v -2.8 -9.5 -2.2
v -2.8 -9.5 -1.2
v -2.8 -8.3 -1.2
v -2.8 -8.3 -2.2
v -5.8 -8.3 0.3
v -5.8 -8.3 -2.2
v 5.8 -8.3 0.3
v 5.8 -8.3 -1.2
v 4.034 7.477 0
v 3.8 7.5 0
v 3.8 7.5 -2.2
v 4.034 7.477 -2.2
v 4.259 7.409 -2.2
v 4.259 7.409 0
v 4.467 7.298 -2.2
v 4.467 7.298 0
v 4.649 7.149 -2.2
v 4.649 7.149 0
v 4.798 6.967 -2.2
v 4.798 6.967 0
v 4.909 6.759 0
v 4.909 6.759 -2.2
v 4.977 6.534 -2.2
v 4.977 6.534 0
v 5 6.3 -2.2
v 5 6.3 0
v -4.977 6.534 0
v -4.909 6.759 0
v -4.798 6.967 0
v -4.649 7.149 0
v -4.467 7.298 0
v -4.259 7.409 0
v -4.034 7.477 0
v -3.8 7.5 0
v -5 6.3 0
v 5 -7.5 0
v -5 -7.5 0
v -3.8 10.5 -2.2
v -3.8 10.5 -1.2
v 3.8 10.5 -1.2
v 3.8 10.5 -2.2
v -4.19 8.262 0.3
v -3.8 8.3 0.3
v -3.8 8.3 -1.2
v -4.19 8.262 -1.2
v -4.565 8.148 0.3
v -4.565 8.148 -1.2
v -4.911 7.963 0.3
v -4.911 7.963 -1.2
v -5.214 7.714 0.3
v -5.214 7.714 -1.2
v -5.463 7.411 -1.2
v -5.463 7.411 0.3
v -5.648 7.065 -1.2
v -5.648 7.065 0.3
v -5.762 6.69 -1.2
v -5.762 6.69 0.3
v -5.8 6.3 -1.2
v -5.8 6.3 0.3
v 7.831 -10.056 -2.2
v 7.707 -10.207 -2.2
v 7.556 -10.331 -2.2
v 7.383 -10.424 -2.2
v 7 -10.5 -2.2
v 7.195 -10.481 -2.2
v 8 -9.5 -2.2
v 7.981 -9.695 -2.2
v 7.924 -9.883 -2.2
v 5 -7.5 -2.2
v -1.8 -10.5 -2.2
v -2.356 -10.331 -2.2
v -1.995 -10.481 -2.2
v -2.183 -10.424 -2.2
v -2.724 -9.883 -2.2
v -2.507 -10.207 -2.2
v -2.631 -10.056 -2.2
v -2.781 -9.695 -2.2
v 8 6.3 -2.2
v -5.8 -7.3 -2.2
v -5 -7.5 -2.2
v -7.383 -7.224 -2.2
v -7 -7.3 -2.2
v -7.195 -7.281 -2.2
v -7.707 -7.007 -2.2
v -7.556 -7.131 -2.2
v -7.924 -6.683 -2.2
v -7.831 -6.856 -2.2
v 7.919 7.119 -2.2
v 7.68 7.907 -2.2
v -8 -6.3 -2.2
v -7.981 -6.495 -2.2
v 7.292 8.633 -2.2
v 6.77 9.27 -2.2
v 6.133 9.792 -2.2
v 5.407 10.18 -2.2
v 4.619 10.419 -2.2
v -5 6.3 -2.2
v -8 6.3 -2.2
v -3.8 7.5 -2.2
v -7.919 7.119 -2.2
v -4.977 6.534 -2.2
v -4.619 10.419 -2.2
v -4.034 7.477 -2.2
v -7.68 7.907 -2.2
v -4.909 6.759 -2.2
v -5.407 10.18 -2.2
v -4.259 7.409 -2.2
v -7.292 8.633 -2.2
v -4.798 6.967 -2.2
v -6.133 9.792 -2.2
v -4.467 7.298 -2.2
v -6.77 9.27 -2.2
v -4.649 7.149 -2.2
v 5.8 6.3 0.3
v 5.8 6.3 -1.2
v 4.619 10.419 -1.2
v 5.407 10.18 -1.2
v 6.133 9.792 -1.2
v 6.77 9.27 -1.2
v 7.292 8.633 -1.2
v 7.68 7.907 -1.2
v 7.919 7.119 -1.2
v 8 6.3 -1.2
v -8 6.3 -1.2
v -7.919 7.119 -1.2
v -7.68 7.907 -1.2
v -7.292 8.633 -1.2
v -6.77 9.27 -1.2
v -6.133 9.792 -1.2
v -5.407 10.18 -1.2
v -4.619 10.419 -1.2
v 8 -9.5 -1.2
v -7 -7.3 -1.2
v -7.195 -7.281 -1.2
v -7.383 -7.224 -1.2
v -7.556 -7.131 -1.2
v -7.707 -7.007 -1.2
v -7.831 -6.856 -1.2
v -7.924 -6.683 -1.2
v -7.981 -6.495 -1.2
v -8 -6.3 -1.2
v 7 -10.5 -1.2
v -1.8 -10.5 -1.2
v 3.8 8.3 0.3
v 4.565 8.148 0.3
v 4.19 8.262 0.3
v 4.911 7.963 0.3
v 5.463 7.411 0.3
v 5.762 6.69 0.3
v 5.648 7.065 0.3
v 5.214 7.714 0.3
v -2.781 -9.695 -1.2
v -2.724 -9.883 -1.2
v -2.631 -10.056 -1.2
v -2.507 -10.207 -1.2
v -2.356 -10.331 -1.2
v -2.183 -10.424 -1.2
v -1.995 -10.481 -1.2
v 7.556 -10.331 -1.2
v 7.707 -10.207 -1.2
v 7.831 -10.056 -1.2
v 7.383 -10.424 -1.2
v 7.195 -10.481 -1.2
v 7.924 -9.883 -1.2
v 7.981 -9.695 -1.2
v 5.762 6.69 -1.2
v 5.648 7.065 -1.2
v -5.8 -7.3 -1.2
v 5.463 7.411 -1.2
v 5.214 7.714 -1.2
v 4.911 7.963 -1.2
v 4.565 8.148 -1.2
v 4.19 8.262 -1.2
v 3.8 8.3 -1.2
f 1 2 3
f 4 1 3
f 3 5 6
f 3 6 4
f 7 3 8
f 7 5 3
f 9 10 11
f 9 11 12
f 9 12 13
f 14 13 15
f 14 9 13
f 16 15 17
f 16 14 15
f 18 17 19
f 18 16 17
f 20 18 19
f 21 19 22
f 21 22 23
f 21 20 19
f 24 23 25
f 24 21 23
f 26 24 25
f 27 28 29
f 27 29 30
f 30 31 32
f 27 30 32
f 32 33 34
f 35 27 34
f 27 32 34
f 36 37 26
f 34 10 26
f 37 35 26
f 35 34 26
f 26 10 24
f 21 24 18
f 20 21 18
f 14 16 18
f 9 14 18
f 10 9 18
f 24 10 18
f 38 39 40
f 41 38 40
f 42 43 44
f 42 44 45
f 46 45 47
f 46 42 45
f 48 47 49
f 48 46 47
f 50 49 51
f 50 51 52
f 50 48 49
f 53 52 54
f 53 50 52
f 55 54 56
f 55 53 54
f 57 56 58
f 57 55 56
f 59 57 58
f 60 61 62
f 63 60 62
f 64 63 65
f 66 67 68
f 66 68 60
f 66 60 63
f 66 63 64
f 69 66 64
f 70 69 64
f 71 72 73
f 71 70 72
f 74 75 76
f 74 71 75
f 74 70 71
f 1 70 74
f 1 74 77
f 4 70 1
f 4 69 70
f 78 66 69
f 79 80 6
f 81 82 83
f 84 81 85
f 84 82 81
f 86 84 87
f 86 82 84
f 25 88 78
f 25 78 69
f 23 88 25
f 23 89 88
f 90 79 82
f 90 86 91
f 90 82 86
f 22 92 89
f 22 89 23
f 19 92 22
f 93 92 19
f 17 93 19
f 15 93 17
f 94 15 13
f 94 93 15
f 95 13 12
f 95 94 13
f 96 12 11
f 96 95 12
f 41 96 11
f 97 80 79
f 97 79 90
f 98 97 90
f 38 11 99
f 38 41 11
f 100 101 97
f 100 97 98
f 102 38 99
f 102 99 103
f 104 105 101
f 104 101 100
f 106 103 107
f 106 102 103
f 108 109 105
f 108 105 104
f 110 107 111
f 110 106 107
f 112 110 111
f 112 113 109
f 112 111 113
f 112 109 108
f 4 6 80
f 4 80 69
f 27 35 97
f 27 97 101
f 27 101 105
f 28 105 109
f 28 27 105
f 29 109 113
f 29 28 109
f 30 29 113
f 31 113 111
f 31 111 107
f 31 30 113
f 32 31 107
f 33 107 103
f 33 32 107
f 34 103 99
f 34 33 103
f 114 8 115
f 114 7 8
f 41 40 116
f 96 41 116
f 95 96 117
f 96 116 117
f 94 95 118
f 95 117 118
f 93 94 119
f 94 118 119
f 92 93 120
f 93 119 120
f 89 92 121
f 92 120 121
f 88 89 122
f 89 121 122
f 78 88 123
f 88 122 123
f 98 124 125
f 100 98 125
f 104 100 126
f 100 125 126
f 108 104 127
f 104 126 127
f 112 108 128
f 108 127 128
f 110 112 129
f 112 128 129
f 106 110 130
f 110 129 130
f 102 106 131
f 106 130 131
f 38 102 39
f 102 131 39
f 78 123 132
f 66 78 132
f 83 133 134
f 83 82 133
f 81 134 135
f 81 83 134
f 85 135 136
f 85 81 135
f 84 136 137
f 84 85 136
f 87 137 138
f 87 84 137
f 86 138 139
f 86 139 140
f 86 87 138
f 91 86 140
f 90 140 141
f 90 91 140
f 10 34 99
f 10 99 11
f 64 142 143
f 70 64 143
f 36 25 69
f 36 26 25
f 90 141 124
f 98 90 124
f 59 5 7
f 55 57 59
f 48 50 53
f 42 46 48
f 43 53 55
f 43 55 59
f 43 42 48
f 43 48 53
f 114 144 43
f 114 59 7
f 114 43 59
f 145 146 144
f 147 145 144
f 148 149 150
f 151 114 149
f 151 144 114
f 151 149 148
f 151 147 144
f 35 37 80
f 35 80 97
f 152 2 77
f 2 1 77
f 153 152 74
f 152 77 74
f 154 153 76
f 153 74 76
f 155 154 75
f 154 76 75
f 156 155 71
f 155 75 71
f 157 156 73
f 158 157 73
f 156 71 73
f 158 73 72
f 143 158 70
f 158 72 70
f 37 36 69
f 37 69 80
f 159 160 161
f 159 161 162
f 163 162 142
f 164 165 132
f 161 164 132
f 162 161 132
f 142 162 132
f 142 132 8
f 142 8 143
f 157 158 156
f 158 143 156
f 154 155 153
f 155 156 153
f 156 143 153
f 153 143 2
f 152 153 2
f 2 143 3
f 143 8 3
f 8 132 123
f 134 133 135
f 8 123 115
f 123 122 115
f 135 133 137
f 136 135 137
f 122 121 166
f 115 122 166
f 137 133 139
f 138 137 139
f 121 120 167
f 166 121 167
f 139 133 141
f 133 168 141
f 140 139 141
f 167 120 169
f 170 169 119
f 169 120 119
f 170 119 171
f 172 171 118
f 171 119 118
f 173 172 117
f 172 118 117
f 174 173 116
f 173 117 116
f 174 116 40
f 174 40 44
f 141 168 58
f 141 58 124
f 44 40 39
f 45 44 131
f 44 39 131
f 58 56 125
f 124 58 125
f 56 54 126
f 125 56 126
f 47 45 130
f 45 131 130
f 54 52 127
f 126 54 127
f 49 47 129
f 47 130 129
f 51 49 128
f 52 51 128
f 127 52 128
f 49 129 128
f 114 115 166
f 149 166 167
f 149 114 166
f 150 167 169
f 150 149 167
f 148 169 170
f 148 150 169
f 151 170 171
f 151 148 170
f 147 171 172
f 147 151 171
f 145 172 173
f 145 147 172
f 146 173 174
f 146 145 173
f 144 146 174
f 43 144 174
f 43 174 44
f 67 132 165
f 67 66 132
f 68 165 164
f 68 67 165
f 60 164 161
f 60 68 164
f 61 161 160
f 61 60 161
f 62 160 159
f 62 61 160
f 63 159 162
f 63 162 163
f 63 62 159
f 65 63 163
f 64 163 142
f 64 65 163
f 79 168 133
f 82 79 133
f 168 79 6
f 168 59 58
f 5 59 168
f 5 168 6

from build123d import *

# Parameters (mm, degrees)
SKETCH1_W           = 11.6
SKETCH1_H           = 16.6
BOSS_EXTRUDE1_DEPTH = 0.3
FILLET1_R           = 2
BOSS_EXTRUDE2_DEPTH = 1.2
BOSS_EXTRUDE3_DEPTH = 1
FILLET2_R           = 1


with BuildPart() as part:
    # Sketch1 → Boss-Extrude1 (new body)
    with BuildSketch(Plane.XY):
        Rectangle(SKETCH1_W, SKETCH1_H)
    extrude(amount=BOSS_EXTRUDE1_DEPTH)

    # Fillet1
    fillet1_edges = [part.edges().sort_by_distance(p)[0] for p in [
        (-5.8, 8.3, 0.15),
        (5.8, 8.3, 0.15),
    ]]
    fillet(fillet1_edges, radius=FILLET1_R)

    # Sketch2 → Boss-Extrude2 (add)
    with BuildSketch(Plane(origin=(0, 0, 0), x_dir=(-1, 0, 0), z_dir=(0, 0, -1))):
        with BuildLine():
            Line((-5.8, -8.3), (-5.8, 6.3))
            ThreePointArc((-5.8, 6.3), (-5.214213562, 7.714213562), (-3.8, 8.3))
            Line((-3.8, 8.3), (3.8, 8.3))
            ThreePointArc((3.8, 8.3), (5.214213562, 7.714213562), (5.8, 6.3))
            Line((5.8, 6.3), (5.8, -8.3))
            Line((5.8, -8.3), (-5.8, -8.3))
        make_face()
        with BuildLine():
            Line((-5, -7.5), (-5, 6.3))
            ThreePointArc((-5, 6.3), (-4.648528137, 7.148528137), (-3.8, 7.5))
            Line((-3.8, 7.5), (3.8, 7.5))
            ThreePointArc((3.8, 7.5), (4.648528137, 7.148528137), (5, 6.3))
            Line((5, 6.3), (5, -7.5))
            Line((5, -7.5), (-5, -7.5))
        make_face(mode=Mode.SUBTRACT)
    extrude(amount=BOSS_EXTRUDE2_DEPTH)

    # Sketch3 → Boss-Extrude3 (add)
    with BuildSketch(Plane(origin=(0, 0, -1.2), x_dir=(-1, 0, 0), z_dir=(0, 0, -1))):
        with BuildLine():
            Line((-8, 6.3), (-8, -10.5))
            Line((-8, -10.5), (2.8, -10.5))
            Line((2.8, -10.5), (2.8, -8.3))
            Line((2.8, -8.3), (5.8, -8.3))
            Line((5.8, -8.3), (5.8, -7.3))
            Line((5.8, -7.3), (8, -7.3))
            Line((8, -7.3), (8, 6.3))
            ThreePointArc((8, 6.3), (6.769848481, 9.269848481), (3.8, 10.5))
            Line((3.8, 10.5), (-3.8, 10.5))
            ThreePointArc((-3.8, 10.5), (-6.769848481, 9.269848481), (-8, 6.3))
        make_face()
        with BuildLine():
            Line((-5, 6.3), (-5, -7.5))
            Line((-5, -7.5), (5, -7.5))
            Line((5, -7.5), (5, 6.3))
            ThreePointArc((5, 6.3), (4.648528137, 7.148528137), (3.8, 7.5))
            Line((3.8, 7.5), (-3.8, 7.5))
            ThreePointArc((-3.8, 7.5), (-4.648528137, 7.148528137), (-5, 6.3))
        make_face(mode=Mode.SUBTRACT)
    extrude(amount=BOSS_EXTRUDE3_DEPTH)

    # Fillet2
    fillet2_edges = [part.edges().sort_by_distance(p)[0] for p in [
        (8, -10.5, -1.7),
        (-2.8, -10.5, -1.7),
        (-8, -7.3, -1.7),
    ]]
    fillet(fillet2_edges, radius=FILLET2_R)


solid = part.part
